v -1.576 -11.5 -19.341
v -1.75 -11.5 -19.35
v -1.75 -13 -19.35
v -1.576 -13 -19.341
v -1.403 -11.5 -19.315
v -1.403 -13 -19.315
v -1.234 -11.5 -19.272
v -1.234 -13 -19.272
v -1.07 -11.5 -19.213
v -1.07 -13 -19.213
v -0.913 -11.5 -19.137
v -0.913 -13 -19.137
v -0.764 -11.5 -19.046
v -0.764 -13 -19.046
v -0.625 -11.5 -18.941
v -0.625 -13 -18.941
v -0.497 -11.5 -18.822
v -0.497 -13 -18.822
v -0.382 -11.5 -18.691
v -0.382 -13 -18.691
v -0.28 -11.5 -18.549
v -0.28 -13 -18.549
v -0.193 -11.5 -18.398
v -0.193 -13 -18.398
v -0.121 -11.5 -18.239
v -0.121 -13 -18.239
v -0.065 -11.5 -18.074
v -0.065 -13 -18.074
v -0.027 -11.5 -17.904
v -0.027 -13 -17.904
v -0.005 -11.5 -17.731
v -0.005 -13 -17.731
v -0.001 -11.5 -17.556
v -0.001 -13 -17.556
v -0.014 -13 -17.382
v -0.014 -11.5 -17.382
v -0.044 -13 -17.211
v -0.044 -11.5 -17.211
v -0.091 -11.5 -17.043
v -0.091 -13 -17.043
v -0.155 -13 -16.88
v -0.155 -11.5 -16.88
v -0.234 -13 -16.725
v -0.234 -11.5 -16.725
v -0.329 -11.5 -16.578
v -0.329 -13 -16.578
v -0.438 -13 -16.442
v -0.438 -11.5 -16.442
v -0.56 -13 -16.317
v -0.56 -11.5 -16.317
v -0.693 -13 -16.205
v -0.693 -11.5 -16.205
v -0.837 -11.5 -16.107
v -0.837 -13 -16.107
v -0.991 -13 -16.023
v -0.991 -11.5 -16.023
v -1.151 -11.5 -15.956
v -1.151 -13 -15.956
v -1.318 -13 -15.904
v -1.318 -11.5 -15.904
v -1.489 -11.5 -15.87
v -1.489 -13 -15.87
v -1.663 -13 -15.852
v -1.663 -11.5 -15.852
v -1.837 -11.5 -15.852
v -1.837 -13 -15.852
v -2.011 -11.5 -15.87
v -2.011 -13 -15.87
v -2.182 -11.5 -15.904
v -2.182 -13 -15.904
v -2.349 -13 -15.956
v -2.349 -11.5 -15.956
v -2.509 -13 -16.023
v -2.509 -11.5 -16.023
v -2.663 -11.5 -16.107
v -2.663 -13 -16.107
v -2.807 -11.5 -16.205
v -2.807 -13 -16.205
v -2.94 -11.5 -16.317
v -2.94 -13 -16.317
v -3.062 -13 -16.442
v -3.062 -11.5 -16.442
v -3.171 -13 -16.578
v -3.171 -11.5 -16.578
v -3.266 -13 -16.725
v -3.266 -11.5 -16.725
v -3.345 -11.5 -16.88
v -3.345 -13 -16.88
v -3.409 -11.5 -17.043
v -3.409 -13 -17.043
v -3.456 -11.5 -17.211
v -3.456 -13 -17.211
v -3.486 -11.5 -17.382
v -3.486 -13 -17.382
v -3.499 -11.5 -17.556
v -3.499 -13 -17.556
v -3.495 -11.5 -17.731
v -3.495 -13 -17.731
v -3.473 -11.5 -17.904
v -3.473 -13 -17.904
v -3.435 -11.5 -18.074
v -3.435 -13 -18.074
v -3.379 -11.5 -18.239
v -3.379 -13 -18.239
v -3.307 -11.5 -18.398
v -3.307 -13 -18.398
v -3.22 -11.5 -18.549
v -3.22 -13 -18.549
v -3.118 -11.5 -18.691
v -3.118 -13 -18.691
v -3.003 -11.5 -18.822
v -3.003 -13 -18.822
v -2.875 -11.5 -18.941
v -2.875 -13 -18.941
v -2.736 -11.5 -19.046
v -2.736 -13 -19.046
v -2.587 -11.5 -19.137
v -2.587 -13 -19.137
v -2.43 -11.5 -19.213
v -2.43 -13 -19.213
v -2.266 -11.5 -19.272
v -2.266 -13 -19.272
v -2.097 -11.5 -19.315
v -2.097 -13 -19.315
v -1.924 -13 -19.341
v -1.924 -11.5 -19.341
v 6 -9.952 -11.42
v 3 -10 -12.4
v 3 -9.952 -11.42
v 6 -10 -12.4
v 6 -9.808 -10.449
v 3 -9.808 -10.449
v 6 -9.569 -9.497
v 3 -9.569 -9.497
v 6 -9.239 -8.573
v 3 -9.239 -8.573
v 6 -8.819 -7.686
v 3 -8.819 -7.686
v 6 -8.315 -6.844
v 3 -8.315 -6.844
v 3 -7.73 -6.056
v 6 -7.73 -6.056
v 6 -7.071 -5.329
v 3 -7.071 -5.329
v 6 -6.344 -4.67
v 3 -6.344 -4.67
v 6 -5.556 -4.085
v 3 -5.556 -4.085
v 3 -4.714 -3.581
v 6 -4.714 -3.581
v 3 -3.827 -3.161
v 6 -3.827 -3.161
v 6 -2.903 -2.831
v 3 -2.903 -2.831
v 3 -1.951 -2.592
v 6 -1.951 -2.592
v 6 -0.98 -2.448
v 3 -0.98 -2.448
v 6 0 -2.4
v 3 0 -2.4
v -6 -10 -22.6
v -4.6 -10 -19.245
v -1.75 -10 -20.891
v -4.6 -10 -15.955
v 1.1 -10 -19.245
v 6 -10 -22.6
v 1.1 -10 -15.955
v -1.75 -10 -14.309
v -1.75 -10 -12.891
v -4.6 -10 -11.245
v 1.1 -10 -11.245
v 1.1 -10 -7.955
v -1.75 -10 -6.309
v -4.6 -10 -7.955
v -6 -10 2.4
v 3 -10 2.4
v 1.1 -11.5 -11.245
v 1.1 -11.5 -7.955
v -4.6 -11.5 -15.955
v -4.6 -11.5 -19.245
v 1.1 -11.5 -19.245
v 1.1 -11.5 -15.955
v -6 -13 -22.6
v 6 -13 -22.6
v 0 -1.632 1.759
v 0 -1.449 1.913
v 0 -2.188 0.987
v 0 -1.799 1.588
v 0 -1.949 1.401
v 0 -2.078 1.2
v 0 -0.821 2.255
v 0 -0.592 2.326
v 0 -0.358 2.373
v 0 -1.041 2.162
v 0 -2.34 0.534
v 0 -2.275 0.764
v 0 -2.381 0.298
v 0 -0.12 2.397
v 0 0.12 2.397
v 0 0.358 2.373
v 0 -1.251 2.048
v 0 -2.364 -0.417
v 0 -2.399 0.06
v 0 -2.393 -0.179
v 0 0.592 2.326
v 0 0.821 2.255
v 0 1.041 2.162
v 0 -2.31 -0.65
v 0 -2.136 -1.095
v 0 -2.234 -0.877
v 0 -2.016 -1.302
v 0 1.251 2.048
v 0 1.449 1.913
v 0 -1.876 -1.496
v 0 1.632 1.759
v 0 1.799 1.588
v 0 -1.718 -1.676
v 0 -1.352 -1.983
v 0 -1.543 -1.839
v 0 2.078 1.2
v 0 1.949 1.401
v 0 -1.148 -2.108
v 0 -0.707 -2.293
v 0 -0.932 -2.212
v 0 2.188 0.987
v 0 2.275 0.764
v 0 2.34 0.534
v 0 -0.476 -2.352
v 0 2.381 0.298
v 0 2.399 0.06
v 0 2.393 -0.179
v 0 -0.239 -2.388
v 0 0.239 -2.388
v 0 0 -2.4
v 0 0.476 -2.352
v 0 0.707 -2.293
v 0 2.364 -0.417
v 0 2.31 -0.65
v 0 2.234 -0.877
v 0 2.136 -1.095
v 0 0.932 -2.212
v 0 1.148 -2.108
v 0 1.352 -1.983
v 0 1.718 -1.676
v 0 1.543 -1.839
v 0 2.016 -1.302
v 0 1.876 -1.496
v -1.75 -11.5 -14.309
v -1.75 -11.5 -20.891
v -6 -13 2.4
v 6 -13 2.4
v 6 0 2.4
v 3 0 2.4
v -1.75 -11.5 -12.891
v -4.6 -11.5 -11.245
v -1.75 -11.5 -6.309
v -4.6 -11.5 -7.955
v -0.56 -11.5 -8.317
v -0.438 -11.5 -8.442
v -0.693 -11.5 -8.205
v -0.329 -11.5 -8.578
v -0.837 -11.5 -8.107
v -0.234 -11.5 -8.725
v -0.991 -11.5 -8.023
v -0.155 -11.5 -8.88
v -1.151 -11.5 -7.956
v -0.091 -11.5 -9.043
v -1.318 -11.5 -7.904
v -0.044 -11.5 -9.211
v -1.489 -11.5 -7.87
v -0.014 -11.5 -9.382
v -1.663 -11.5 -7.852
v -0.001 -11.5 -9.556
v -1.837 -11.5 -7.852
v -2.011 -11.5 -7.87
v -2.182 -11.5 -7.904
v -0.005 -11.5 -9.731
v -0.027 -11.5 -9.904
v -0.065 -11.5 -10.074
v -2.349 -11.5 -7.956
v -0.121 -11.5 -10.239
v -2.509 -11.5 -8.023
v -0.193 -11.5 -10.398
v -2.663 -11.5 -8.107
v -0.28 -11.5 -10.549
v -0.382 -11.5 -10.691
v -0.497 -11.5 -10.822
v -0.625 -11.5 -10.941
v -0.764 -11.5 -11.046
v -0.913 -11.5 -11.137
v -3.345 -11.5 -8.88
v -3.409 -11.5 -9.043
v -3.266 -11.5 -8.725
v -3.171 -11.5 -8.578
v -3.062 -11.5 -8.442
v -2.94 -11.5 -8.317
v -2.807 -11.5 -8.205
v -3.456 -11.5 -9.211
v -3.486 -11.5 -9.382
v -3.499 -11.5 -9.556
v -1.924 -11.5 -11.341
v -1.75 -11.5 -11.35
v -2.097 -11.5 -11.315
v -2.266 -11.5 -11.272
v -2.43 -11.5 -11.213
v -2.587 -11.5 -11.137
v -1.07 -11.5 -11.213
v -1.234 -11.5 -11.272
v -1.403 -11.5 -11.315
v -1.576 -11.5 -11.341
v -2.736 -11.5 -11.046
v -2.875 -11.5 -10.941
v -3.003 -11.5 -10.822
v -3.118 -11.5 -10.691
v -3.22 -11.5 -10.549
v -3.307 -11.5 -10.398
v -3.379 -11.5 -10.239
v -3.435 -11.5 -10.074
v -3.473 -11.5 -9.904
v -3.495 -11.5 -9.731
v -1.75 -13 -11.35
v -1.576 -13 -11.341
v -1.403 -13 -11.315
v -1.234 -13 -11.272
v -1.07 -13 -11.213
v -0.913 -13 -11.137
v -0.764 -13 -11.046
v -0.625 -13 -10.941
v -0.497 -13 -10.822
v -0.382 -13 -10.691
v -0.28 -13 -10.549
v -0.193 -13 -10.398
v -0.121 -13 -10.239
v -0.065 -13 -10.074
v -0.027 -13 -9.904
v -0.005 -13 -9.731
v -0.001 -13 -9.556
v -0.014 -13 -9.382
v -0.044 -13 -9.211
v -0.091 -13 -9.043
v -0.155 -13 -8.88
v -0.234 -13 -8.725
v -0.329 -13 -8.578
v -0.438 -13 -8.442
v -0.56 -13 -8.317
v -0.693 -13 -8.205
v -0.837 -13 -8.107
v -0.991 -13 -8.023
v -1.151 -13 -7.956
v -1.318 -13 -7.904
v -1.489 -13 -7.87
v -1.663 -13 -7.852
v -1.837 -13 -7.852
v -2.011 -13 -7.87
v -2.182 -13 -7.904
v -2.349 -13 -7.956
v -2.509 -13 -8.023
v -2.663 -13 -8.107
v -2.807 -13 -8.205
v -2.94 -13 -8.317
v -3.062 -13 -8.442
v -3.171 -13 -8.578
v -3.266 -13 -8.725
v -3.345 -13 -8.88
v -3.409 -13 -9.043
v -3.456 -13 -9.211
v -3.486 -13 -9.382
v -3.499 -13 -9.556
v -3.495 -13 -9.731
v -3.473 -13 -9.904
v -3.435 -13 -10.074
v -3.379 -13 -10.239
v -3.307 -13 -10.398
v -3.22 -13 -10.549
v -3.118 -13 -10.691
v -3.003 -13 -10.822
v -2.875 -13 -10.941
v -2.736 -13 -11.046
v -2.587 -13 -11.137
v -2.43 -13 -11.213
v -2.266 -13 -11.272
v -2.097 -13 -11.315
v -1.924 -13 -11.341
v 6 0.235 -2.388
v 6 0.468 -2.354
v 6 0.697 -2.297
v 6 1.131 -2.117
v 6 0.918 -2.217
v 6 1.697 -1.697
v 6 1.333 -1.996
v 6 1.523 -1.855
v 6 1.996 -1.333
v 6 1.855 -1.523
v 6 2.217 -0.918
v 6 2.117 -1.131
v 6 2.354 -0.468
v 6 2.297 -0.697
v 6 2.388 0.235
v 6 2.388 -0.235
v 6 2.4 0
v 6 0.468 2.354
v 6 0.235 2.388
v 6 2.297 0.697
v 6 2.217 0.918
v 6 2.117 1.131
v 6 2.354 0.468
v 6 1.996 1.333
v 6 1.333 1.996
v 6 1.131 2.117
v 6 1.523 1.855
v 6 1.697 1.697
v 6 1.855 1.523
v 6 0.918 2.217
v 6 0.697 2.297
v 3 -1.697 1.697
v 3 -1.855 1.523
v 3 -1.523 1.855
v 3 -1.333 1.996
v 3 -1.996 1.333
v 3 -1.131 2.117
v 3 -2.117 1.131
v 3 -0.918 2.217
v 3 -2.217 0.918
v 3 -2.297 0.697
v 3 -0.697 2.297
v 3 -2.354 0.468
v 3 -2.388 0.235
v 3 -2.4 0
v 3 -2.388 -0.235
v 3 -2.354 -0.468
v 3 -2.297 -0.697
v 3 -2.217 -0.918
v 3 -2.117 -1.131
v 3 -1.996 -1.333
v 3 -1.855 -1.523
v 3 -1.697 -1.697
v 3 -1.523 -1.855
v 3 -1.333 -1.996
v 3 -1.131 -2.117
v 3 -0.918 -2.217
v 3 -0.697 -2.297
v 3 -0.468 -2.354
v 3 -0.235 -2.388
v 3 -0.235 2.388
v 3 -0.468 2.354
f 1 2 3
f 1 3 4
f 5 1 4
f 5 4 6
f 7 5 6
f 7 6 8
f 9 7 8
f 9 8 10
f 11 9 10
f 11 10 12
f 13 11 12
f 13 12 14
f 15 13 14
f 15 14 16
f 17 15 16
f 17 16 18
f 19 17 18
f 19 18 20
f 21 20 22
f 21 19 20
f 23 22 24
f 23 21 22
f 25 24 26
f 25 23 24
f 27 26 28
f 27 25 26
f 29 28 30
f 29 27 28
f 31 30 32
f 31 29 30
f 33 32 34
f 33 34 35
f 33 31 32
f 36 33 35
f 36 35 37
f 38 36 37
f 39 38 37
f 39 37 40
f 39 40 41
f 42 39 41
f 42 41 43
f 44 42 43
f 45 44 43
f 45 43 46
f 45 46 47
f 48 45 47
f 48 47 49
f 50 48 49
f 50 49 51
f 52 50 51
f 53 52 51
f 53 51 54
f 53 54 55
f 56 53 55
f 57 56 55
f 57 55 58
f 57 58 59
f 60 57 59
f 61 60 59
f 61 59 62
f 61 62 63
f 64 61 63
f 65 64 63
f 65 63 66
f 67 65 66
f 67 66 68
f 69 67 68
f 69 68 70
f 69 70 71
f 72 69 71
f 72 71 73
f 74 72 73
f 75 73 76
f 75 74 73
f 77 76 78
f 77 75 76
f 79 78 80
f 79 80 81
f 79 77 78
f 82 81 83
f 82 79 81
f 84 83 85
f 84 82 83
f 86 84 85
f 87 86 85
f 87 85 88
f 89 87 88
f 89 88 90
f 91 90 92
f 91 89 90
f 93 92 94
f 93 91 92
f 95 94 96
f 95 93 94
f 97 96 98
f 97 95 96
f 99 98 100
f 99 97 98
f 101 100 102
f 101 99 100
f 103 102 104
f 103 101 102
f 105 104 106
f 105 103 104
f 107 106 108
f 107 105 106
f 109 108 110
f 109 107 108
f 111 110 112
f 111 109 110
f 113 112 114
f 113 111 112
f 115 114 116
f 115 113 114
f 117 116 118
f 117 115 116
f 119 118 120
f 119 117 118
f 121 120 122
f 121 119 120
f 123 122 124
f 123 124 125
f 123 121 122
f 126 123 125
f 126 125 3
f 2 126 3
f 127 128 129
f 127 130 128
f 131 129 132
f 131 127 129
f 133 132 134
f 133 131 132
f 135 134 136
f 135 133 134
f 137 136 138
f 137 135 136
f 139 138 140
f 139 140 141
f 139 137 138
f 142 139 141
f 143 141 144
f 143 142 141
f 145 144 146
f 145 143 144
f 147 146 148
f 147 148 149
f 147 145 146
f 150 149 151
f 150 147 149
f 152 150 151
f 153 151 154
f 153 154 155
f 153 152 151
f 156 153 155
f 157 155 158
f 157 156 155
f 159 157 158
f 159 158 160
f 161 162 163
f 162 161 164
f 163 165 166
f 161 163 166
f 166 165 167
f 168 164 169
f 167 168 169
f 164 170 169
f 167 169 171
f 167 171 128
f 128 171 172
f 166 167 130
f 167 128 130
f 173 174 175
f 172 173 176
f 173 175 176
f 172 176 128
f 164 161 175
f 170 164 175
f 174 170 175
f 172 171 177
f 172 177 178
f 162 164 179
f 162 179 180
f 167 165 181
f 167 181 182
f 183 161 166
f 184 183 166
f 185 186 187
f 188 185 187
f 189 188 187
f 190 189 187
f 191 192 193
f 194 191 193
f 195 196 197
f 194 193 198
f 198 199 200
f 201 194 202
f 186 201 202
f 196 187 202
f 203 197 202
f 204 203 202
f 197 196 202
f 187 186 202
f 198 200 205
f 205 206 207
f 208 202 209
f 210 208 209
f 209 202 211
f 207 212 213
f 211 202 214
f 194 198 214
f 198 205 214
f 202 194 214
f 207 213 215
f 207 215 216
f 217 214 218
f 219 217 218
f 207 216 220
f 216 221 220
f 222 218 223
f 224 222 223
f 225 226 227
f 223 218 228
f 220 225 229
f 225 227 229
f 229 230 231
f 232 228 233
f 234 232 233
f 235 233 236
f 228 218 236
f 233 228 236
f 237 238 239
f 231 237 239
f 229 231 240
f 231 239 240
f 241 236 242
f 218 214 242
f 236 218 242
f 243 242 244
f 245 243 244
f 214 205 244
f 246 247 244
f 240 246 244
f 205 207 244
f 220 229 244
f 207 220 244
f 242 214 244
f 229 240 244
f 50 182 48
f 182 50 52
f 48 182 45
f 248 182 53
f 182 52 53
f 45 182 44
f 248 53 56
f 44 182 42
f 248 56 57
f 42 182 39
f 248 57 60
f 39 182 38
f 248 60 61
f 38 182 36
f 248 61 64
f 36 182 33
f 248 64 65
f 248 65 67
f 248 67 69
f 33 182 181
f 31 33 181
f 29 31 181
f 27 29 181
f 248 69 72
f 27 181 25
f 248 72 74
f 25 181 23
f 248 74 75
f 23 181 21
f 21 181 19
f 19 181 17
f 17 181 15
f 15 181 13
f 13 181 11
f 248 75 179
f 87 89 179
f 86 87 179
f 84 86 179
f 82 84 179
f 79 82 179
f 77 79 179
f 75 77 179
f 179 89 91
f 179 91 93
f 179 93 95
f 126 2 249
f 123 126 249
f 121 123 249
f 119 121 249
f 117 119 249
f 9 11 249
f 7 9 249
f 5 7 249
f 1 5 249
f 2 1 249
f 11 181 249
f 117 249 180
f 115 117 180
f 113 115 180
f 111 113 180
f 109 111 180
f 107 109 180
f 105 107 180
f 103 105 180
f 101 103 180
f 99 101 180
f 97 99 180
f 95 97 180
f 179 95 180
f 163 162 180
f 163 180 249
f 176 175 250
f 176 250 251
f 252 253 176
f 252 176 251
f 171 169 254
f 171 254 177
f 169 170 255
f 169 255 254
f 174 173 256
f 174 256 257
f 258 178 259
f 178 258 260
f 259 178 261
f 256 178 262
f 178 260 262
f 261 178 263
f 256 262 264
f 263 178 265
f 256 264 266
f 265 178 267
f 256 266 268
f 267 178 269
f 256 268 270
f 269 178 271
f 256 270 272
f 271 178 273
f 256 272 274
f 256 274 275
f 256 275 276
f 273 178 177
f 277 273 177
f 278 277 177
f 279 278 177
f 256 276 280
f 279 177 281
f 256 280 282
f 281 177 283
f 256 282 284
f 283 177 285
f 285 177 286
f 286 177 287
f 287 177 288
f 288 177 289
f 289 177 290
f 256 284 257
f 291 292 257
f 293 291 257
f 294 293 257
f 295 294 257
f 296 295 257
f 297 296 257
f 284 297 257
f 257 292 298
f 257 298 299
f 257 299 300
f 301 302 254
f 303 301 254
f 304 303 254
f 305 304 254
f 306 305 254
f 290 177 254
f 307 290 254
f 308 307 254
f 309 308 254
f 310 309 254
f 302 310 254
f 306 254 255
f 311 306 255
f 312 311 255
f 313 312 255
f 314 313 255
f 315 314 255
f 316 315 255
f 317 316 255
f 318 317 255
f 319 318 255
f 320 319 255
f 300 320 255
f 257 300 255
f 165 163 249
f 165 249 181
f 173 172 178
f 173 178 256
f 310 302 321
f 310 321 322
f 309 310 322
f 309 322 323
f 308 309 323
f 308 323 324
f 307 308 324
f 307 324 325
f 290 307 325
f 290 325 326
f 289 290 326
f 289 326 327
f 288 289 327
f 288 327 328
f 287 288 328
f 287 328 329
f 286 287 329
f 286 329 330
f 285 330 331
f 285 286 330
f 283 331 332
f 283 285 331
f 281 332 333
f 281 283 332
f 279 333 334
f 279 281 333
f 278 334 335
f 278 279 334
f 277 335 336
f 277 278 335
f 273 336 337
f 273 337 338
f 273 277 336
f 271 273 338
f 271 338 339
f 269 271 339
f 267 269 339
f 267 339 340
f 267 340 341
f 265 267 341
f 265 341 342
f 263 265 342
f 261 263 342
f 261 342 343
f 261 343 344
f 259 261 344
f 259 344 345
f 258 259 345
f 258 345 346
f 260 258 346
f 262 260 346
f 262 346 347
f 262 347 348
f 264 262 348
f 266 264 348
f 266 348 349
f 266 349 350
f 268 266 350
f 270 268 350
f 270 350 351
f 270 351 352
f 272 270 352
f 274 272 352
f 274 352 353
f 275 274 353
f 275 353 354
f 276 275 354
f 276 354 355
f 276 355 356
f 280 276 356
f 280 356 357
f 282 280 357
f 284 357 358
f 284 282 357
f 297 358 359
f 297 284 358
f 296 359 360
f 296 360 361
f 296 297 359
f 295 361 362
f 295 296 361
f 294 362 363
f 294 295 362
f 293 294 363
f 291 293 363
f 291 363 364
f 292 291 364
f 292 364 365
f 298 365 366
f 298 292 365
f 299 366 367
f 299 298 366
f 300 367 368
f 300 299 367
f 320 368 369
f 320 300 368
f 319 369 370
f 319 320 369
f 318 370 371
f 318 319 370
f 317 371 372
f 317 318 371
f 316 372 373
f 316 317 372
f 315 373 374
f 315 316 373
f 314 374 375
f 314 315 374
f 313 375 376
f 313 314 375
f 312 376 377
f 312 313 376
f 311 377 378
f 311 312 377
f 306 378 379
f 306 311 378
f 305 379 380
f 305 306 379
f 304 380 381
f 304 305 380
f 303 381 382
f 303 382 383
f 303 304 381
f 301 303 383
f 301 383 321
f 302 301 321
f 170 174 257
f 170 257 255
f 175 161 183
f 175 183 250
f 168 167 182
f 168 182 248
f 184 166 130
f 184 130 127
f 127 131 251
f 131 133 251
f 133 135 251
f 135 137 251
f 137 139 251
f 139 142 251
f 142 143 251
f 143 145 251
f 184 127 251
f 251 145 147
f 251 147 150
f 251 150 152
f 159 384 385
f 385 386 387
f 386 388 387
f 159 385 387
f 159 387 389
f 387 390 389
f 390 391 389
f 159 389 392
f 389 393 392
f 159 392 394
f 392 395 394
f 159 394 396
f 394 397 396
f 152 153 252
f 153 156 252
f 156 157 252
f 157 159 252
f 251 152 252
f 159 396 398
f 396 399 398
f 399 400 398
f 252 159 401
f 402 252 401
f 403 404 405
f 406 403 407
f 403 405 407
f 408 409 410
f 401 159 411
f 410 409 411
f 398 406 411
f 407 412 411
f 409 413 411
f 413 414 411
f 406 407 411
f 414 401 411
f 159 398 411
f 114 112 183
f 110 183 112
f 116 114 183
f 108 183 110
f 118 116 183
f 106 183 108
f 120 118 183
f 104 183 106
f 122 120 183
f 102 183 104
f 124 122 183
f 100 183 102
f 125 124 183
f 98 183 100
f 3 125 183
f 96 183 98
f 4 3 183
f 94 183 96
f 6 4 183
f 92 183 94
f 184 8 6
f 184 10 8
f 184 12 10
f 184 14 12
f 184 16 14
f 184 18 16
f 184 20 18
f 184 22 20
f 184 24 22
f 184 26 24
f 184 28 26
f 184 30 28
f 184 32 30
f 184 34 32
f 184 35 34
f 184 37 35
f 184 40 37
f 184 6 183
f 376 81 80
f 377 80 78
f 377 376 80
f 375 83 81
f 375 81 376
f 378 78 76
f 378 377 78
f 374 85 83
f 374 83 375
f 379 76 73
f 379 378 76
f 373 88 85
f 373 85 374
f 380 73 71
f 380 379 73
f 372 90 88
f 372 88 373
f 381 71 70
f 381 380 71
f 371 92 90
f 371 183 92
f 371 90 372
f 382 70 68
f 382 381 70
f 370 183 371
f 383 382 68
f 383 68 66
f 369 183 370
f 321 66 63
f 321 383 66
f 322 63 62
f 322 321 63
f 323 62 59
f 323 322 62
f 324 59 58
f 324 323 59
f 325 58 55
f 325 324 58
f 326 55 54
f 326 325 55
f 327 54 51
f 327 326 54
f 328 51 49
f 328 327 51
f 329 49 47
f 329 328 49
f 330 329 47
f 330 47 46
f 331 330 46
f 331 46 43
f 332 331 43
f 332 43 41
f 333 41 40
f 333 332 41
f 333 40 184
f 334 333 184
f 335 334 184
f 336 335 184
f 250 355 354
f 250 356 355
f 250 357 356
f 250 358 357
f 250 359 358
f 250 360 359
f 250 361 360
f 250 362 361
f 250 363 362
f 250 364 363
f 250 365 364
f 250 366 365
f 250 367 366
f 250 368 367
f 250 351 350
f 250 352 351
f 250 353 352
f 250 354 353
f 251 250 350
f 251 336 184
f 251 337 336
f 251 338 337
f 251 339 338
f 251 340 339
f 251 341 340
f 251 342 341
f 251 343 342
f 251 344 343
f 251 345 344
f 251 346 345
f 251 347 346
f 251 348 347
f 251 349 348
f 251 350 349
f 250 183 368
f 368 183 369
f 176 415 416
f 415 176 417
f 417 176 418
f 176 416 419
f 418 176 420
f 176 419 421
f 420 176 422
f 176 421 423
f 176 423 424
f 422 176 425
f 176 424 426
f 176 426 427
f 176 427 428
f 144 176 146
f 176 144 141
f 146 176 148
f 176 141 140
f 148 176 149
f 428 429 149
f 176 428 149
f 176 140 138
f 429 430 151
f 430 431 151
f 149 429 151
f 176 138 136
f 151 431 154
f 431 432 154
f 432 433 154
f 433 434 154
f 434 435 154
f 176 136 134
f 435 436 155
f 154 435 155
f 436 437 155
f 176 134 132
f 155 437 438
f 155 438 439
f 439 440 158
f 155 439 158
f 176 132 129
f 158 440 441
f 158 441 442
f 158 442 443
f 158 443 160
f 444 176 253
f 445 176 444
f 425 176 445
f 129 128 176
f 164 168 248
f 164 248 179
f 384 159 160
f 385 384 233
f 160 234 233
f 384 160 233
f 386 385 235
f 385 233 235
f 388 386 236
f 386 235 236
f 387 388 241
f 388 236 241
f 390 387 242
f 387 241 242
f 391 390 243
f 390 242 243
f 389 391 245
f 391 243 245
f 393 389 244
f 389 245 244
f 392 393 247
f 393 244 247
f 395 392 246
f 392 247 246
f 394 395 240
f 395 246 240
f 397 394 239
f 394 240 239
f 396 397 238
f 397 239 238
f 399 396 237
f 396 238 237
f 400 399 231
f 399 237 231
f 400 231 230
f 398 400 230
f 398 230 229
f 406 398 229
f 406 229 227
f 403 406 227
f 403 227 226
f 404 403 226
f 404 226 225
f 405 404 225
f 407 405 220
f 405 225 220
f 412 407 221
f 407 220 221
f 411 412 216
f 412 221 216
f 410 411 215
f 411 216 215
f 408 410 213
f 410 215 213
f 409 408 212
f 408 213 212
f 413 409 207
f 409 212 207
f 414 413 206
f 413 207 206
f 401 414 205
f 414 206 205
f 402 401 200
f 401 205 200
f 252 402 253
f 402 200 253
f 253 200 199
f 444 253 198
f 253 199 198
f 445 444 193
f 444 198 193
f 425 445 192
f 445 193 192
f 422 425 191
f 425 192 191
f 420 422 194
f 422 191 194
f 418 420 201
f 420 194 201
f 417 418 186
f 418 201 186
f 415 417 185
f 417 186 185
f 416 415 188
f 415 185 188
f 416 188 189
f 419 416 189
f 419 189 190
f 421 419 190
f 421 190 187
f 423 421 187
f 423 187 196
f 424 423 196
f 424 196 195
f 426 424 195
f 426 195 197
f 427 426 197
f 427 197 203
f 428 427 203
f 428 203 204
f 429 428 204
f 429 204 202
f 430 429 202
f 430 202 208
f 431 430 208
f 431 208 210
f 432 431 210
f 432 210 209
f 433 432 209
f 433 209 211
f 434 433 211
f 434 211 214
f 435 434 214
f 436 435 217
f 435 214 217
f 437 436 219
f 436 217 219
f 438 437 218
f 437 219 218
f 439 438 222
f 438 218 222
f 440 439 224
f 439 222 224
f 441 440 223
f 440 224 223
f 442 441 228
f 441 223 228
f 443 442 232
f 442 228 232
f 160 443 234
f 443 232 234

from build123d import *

# Parameters (mm, degrees)
ESQUISSE1_R             = 2.4
BOSS_EXTRU_1_DEPTH      = 3
BOSS_EXTRU_2_DEPTH      = 3
ESQUISSE3_W             = 12
ESQUISSE3_H             = 25
ESQUISSE3_R             = 1.75
BOSS_EXTRU_3_DEPTH      = 3
ENL_V_MAT_EXTRU_1_DEPTH = 1.5
CONG_1_R                = 10


with BuildPart() as part:
    # Esquisse1 → Boss.-Extru.1 (new body)
    with BuildSketch(Plane(origin=(0, 0, 0), x_dir=(0, 0, -1), z_dir=(1, 0, 0))):
        Circle(ESQUISSE1_R)
    extrude(amount=BOSS_EXTRU_1_DEPTH)

    # Esquisse2 → Boss.-Extru.2 (add)
    with BuildSketch(Plane(origin=(3, 0, 0), x_dir=(0, 0, -1), z_dir=(1, 0, 0))):
        with BuildLine():
            Line((-2.4, 0), (-2.4, -10))
            Line((-2.4, -10), (2.4, -10))
            Line((2.4, -10), (2.4, 0))
            ThreePointArc((2.4, 0), (0, 2.4), (-2.4, 0))
        make_face()
    extrude(amount=BOSS_EXTRU_2_DEPTH)

    # Esquisse3 → Boss.-Extru.3 (add)
    with BuildSketch(Plane.XZ.offset(10)):
        with Locations((0, -10.1)):
            Rectangle(ESQUISSE3_W, ESQUISSE3_H)
        with Locations(Location((-1.75, -9.6, 0), (0, 0, 270))):
            Circle(ESQUISSE3_R, mode=Mode.SUBTRACT)
        with Locations(Location((-1.75, -17.6, 0), (0, 0, 270))):
            Circle(ESQUISSE3_R, mode=Mode.SUBTRACT)
    extrude(amount=BOSS_EXTRU_3_DEPTH)

    # Esquisse4 → Enlèv. mat.-Extru.1 (cut)
    with BuildSketch(Plane(origin=(0, -10, 0), x_dir=(1, 0, 0), z_dir=(0, 1, 0))):
        Polygon((-4.6, 7.954551733), (-4.6, 11.245448267), (-1.75, 12.890896534), (1.1, 11.245448267), (1.1, 7.954551733), (-1.75, 6.309103466), align=None)
        Polygon((-4.6, 15.954551733), (-4.6, 19.245448267), (-1.75, 20.890896534), (1.1, 19.245448267), (1.1, 15.954551733), (-1.75, 14.309103466), align=None)
    extrude(amount=-ENL_V_MAT_EXTRU_1_DEPTH, mode=Mode.SUBTRACT)

    # Congé1
    cong_1_edges = [part.edges().sort_by_distance(p)[0] for p in [
        (4.5, -10, -2.4),
    ]]
    fillet(cong_1_edges, radius=CONG_1_R - 0.0001)  # a hair under: the kernel refuses the full size


solid = part.part
